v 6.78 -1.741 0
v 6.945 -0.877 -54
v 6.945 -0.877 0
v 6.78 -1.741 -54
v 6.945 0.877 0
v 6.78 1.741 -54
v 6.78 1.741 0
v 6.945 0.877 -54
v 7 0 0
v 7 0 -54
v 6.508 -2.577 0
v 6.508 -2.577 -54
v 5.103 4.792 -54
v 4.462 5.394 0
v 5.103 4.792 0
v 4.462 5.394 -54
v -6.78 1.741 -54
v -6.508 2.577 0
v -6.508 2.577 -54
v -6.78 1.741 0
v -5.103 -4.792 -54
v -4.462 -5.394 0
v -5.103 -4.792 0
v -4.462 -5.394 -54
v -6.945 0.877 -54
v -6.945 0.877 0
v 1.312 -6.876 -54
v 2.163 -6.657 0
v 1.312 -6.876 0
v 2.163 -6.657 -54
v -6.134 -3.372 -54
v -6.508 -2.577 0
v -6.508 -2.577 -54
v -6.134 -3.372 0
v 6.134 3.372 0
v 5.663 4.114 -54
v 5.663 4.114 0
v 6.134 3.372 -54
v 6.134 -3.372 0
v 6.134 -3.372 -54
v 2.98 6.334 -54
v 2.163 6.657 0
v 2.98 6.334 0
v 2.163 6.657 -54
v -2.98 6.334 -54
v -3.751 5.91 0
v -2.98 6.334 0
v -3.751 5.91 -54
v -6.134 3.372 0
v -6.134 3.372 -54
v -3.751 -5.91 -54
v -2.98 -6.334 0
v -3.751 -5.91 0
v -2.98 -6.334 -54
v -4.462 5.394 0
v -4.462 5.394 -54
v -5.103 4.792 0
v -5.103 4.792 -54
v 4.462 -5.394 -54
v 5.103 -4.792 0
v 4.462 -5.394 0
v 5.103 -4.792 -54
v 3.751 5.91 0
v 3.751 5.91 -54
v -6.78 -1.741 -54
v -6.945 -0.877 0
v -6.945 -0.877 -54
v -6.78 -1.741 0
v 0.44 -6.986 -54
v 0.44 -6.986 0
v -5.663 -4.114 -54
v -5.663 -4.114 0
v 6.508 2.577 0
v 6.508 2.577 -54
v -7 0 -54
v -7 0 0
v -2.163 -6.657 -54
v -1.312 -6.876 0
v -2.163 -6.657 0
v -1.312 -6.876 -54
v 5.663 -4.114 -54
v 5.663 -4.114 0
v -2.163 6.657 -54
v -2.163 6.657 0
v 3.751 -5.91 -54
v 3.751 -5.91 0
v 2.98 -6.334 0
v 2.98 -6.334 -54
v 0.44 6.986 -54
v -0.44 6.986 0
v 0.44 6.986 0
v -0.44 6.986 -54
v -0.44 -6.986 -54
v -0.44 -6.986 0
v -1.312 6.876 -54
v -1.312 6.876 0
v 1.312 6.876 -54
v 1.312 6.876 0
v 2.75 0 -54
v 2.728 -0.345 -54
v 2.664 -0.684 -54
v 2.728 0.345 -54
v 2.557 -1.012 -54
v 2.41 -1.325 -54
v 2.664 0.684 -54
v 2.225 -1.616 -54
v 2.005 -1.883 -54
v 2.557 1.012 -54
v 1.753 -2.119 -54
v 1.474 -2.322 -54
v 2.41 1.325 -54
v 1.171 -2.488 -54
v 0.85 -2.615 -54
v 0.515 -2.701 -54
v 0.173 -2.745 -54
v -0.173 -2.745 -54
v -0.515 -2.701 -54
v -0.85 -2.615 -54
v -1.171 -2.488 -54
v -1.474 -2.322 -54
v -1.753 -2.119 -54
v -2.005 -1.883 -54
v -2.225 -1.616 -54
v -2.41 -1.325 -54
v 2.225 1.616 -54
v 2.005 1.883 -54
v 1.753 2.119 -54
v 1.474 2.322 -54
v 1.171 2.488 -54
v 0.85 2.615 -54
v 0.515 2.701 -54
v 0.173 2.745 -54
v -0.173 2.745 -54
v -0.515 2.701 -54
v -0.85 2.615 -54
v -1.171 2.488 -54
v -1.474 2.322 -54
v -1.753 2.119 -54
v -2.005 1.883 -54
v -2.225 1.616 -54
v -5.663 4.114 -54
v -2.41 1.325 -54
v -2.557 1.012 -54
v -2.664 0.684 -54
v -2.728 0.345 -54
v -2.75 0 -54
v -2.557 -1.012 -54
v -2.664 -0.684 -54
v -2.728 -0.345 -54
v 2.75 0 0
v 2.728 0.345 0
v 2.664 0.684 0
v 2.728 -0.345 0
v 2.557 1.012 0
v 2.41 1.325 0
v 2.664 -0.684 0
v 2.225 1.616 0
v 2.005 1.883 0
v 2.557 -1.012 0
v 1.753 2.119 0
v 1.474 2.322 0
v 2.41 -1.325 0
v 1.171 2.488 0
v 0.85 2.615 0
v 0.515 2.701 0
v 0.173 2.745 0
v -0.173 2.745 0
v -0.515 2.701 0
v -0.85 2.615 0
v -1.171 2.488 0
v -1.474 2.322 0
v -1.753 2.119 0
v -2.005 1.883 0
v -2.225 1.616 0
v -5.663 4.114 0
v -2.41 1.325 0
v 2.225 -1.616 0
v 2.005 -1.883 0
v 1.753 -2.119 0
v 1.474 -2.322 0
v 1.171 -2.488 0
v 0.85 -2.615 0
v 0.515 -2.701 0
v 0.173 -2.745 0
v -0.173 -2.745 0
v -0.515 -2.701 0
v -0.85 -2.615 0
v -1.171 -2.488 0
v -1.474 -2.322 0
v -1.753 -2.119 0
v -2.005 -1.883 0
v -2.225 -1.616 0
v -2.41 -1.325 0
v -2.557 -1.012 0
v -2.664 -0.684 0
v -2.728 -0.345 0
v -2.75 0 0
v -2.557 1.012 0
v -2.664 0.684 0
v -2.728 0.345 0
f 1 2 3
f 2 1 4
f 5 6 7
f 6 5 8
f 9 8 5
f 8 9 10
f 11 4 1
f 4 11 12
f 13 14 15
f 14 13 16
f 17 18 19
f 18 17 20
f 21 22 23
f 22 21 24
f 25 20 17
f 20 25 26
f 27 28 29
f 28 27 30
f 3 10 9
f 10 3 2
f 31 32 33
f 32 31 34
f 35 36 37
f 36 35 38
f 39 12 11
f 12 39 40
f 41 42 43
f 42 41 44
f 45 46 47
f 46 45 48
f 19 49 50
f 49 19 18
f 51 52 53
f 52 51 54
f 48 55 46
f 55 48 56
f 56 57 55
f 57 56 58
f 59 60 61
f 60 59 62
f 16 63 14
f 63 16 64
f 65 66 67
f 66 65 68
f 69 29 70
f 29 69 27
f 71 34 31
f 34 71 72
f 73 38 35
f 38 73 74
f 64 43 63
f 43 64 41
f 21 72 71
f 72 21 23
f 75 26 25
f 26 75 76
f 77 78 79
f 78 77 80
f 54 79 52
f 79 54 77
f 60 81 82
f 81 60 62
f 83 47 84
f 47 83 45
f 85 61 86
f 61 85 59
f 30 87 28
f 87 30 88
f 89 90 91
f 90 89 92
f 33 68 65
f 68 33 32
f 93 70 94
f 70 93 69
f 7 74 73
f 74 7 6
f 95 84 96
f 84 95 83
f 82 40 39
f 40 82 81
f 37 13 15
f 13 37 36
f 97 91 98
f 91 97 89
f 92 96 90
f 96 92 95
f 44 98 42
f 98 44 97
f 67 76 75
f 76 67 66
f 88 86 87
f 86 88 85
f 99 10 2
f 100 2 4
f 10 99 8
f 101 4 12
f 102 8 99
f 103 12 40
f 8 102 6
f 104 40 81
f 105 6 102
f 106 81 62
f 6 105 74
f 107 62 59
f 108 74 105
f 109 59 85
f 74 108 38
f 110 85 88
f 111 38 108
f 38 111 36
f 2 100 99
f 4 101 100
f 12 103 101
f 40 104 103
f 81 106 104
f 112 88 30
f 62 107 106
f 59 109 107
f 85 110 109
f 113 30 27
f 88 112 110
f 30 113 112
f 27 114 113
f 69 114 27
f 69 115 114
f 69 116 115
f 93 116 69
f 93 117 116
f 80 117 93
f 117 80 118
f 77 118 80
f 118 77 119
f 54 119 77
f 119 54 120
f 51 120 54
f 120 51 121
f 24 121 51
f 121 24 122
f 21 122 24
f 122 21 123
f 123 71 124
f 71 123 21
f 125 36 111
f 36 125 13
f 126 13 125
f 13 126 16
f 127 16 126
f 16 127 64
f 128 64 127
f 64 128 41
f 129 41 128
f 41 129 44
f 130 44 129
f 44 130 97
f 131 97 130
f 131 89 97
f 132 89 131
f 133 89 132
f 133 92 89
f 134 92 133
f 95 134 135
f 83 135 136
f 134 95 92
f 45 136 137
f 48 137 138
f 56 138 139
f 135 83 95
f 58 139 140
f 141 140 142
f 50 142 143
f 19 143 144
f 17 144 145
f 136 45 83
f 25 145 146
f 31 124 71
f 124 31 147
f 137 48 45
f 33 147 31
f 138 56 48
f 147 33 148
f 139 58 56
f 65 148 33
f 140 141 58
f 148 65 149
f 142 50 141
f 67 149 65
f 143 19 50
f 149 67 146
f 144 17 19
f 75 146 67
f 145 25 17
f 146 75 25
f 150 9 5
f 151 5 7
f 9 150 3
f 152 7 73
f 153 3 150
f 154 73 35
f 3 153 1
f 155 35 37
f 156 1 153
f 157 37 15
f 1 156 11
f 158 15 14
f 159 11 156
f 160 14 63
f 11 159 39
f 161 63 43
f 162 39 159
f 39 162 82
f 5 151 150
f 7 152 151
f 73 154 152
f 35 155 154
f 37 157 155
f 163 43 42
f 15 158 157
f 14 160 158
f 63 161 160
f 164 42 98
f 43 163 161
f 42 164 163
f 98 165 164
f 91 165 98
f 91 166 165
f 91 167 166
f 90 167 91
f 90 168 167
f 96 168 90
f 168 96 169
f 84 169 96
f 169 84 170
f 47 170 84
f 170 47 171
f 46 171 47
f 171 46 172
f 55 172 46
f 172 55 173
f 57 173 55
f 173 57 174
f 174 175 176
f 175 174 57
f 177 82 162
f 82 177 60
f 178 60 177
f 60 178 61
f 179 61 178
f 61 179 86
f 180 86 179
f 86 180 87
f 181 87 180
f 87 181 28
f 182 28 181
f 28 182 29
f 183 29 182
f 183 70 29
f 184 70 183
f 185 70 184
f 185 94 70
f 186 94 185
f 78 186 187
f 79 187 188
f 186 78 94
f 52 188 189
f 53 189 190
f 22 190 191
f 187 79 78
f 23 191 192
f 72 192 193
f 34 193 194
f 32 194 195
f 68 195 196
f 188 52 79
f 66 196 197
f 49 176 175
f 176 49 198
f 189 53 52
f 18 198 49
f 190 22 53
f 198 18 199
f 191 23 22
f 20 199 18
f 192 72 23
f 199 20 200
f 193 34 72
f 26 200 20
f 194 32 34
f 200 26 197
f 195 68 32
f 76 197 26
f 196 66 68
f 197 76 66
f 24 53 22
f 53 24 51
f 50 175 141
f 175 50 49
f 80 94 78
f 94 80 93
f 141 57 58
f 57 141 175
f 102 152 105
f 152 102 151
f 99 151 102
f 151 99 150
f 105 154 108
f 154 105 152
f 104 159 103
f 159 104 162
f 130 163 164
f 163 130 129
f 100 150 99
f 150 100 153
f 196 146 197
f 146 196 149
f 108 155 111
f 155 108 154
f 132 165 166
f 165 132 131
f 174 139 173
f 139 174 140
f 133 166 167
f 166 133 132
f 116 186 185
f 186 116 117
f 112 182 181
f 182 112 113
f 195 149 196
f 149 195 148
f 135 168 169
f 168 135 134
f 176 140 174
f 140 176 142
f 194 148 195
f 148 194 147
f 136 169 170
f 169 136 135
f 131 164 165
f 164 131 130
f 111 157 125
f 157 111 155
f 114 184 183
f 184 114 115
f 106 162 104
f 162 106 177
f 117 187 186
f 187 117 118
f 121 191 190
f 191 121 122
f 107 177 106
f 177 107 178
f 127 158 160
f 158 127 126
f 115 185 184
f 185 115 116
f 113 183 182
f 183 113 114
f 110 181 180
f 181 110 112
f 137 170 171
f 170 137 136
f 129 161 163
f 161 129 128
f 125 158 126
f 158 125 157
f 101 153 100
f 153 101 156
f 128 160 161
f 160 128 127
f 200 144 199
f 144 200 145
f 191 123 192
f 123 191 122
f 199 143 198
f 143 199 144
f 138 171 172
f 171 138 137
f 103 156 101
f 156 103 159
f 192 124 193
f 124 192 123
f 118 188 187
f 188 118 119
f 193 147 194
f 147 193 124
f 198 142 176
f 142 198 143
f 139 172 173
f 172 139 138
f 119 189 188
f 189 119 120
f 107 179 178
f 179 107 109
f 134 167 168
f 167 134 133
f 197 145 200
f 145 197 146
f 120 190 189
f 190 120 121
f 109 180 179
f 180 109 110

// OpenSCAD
$fn = 50;


difference() {
	union() {
		translate(v = [0, 0, -54.0000000000]) {
			cylinder(h = 54, r = 7.0000000000);
		}
		cylinder(h = 0, r = 13.0000000000);
	}
	union() {
		#translate(v = [0, 0, -54]) {
			cylinder(h = 54, r = 2.7500000000);
		}
	}
}
